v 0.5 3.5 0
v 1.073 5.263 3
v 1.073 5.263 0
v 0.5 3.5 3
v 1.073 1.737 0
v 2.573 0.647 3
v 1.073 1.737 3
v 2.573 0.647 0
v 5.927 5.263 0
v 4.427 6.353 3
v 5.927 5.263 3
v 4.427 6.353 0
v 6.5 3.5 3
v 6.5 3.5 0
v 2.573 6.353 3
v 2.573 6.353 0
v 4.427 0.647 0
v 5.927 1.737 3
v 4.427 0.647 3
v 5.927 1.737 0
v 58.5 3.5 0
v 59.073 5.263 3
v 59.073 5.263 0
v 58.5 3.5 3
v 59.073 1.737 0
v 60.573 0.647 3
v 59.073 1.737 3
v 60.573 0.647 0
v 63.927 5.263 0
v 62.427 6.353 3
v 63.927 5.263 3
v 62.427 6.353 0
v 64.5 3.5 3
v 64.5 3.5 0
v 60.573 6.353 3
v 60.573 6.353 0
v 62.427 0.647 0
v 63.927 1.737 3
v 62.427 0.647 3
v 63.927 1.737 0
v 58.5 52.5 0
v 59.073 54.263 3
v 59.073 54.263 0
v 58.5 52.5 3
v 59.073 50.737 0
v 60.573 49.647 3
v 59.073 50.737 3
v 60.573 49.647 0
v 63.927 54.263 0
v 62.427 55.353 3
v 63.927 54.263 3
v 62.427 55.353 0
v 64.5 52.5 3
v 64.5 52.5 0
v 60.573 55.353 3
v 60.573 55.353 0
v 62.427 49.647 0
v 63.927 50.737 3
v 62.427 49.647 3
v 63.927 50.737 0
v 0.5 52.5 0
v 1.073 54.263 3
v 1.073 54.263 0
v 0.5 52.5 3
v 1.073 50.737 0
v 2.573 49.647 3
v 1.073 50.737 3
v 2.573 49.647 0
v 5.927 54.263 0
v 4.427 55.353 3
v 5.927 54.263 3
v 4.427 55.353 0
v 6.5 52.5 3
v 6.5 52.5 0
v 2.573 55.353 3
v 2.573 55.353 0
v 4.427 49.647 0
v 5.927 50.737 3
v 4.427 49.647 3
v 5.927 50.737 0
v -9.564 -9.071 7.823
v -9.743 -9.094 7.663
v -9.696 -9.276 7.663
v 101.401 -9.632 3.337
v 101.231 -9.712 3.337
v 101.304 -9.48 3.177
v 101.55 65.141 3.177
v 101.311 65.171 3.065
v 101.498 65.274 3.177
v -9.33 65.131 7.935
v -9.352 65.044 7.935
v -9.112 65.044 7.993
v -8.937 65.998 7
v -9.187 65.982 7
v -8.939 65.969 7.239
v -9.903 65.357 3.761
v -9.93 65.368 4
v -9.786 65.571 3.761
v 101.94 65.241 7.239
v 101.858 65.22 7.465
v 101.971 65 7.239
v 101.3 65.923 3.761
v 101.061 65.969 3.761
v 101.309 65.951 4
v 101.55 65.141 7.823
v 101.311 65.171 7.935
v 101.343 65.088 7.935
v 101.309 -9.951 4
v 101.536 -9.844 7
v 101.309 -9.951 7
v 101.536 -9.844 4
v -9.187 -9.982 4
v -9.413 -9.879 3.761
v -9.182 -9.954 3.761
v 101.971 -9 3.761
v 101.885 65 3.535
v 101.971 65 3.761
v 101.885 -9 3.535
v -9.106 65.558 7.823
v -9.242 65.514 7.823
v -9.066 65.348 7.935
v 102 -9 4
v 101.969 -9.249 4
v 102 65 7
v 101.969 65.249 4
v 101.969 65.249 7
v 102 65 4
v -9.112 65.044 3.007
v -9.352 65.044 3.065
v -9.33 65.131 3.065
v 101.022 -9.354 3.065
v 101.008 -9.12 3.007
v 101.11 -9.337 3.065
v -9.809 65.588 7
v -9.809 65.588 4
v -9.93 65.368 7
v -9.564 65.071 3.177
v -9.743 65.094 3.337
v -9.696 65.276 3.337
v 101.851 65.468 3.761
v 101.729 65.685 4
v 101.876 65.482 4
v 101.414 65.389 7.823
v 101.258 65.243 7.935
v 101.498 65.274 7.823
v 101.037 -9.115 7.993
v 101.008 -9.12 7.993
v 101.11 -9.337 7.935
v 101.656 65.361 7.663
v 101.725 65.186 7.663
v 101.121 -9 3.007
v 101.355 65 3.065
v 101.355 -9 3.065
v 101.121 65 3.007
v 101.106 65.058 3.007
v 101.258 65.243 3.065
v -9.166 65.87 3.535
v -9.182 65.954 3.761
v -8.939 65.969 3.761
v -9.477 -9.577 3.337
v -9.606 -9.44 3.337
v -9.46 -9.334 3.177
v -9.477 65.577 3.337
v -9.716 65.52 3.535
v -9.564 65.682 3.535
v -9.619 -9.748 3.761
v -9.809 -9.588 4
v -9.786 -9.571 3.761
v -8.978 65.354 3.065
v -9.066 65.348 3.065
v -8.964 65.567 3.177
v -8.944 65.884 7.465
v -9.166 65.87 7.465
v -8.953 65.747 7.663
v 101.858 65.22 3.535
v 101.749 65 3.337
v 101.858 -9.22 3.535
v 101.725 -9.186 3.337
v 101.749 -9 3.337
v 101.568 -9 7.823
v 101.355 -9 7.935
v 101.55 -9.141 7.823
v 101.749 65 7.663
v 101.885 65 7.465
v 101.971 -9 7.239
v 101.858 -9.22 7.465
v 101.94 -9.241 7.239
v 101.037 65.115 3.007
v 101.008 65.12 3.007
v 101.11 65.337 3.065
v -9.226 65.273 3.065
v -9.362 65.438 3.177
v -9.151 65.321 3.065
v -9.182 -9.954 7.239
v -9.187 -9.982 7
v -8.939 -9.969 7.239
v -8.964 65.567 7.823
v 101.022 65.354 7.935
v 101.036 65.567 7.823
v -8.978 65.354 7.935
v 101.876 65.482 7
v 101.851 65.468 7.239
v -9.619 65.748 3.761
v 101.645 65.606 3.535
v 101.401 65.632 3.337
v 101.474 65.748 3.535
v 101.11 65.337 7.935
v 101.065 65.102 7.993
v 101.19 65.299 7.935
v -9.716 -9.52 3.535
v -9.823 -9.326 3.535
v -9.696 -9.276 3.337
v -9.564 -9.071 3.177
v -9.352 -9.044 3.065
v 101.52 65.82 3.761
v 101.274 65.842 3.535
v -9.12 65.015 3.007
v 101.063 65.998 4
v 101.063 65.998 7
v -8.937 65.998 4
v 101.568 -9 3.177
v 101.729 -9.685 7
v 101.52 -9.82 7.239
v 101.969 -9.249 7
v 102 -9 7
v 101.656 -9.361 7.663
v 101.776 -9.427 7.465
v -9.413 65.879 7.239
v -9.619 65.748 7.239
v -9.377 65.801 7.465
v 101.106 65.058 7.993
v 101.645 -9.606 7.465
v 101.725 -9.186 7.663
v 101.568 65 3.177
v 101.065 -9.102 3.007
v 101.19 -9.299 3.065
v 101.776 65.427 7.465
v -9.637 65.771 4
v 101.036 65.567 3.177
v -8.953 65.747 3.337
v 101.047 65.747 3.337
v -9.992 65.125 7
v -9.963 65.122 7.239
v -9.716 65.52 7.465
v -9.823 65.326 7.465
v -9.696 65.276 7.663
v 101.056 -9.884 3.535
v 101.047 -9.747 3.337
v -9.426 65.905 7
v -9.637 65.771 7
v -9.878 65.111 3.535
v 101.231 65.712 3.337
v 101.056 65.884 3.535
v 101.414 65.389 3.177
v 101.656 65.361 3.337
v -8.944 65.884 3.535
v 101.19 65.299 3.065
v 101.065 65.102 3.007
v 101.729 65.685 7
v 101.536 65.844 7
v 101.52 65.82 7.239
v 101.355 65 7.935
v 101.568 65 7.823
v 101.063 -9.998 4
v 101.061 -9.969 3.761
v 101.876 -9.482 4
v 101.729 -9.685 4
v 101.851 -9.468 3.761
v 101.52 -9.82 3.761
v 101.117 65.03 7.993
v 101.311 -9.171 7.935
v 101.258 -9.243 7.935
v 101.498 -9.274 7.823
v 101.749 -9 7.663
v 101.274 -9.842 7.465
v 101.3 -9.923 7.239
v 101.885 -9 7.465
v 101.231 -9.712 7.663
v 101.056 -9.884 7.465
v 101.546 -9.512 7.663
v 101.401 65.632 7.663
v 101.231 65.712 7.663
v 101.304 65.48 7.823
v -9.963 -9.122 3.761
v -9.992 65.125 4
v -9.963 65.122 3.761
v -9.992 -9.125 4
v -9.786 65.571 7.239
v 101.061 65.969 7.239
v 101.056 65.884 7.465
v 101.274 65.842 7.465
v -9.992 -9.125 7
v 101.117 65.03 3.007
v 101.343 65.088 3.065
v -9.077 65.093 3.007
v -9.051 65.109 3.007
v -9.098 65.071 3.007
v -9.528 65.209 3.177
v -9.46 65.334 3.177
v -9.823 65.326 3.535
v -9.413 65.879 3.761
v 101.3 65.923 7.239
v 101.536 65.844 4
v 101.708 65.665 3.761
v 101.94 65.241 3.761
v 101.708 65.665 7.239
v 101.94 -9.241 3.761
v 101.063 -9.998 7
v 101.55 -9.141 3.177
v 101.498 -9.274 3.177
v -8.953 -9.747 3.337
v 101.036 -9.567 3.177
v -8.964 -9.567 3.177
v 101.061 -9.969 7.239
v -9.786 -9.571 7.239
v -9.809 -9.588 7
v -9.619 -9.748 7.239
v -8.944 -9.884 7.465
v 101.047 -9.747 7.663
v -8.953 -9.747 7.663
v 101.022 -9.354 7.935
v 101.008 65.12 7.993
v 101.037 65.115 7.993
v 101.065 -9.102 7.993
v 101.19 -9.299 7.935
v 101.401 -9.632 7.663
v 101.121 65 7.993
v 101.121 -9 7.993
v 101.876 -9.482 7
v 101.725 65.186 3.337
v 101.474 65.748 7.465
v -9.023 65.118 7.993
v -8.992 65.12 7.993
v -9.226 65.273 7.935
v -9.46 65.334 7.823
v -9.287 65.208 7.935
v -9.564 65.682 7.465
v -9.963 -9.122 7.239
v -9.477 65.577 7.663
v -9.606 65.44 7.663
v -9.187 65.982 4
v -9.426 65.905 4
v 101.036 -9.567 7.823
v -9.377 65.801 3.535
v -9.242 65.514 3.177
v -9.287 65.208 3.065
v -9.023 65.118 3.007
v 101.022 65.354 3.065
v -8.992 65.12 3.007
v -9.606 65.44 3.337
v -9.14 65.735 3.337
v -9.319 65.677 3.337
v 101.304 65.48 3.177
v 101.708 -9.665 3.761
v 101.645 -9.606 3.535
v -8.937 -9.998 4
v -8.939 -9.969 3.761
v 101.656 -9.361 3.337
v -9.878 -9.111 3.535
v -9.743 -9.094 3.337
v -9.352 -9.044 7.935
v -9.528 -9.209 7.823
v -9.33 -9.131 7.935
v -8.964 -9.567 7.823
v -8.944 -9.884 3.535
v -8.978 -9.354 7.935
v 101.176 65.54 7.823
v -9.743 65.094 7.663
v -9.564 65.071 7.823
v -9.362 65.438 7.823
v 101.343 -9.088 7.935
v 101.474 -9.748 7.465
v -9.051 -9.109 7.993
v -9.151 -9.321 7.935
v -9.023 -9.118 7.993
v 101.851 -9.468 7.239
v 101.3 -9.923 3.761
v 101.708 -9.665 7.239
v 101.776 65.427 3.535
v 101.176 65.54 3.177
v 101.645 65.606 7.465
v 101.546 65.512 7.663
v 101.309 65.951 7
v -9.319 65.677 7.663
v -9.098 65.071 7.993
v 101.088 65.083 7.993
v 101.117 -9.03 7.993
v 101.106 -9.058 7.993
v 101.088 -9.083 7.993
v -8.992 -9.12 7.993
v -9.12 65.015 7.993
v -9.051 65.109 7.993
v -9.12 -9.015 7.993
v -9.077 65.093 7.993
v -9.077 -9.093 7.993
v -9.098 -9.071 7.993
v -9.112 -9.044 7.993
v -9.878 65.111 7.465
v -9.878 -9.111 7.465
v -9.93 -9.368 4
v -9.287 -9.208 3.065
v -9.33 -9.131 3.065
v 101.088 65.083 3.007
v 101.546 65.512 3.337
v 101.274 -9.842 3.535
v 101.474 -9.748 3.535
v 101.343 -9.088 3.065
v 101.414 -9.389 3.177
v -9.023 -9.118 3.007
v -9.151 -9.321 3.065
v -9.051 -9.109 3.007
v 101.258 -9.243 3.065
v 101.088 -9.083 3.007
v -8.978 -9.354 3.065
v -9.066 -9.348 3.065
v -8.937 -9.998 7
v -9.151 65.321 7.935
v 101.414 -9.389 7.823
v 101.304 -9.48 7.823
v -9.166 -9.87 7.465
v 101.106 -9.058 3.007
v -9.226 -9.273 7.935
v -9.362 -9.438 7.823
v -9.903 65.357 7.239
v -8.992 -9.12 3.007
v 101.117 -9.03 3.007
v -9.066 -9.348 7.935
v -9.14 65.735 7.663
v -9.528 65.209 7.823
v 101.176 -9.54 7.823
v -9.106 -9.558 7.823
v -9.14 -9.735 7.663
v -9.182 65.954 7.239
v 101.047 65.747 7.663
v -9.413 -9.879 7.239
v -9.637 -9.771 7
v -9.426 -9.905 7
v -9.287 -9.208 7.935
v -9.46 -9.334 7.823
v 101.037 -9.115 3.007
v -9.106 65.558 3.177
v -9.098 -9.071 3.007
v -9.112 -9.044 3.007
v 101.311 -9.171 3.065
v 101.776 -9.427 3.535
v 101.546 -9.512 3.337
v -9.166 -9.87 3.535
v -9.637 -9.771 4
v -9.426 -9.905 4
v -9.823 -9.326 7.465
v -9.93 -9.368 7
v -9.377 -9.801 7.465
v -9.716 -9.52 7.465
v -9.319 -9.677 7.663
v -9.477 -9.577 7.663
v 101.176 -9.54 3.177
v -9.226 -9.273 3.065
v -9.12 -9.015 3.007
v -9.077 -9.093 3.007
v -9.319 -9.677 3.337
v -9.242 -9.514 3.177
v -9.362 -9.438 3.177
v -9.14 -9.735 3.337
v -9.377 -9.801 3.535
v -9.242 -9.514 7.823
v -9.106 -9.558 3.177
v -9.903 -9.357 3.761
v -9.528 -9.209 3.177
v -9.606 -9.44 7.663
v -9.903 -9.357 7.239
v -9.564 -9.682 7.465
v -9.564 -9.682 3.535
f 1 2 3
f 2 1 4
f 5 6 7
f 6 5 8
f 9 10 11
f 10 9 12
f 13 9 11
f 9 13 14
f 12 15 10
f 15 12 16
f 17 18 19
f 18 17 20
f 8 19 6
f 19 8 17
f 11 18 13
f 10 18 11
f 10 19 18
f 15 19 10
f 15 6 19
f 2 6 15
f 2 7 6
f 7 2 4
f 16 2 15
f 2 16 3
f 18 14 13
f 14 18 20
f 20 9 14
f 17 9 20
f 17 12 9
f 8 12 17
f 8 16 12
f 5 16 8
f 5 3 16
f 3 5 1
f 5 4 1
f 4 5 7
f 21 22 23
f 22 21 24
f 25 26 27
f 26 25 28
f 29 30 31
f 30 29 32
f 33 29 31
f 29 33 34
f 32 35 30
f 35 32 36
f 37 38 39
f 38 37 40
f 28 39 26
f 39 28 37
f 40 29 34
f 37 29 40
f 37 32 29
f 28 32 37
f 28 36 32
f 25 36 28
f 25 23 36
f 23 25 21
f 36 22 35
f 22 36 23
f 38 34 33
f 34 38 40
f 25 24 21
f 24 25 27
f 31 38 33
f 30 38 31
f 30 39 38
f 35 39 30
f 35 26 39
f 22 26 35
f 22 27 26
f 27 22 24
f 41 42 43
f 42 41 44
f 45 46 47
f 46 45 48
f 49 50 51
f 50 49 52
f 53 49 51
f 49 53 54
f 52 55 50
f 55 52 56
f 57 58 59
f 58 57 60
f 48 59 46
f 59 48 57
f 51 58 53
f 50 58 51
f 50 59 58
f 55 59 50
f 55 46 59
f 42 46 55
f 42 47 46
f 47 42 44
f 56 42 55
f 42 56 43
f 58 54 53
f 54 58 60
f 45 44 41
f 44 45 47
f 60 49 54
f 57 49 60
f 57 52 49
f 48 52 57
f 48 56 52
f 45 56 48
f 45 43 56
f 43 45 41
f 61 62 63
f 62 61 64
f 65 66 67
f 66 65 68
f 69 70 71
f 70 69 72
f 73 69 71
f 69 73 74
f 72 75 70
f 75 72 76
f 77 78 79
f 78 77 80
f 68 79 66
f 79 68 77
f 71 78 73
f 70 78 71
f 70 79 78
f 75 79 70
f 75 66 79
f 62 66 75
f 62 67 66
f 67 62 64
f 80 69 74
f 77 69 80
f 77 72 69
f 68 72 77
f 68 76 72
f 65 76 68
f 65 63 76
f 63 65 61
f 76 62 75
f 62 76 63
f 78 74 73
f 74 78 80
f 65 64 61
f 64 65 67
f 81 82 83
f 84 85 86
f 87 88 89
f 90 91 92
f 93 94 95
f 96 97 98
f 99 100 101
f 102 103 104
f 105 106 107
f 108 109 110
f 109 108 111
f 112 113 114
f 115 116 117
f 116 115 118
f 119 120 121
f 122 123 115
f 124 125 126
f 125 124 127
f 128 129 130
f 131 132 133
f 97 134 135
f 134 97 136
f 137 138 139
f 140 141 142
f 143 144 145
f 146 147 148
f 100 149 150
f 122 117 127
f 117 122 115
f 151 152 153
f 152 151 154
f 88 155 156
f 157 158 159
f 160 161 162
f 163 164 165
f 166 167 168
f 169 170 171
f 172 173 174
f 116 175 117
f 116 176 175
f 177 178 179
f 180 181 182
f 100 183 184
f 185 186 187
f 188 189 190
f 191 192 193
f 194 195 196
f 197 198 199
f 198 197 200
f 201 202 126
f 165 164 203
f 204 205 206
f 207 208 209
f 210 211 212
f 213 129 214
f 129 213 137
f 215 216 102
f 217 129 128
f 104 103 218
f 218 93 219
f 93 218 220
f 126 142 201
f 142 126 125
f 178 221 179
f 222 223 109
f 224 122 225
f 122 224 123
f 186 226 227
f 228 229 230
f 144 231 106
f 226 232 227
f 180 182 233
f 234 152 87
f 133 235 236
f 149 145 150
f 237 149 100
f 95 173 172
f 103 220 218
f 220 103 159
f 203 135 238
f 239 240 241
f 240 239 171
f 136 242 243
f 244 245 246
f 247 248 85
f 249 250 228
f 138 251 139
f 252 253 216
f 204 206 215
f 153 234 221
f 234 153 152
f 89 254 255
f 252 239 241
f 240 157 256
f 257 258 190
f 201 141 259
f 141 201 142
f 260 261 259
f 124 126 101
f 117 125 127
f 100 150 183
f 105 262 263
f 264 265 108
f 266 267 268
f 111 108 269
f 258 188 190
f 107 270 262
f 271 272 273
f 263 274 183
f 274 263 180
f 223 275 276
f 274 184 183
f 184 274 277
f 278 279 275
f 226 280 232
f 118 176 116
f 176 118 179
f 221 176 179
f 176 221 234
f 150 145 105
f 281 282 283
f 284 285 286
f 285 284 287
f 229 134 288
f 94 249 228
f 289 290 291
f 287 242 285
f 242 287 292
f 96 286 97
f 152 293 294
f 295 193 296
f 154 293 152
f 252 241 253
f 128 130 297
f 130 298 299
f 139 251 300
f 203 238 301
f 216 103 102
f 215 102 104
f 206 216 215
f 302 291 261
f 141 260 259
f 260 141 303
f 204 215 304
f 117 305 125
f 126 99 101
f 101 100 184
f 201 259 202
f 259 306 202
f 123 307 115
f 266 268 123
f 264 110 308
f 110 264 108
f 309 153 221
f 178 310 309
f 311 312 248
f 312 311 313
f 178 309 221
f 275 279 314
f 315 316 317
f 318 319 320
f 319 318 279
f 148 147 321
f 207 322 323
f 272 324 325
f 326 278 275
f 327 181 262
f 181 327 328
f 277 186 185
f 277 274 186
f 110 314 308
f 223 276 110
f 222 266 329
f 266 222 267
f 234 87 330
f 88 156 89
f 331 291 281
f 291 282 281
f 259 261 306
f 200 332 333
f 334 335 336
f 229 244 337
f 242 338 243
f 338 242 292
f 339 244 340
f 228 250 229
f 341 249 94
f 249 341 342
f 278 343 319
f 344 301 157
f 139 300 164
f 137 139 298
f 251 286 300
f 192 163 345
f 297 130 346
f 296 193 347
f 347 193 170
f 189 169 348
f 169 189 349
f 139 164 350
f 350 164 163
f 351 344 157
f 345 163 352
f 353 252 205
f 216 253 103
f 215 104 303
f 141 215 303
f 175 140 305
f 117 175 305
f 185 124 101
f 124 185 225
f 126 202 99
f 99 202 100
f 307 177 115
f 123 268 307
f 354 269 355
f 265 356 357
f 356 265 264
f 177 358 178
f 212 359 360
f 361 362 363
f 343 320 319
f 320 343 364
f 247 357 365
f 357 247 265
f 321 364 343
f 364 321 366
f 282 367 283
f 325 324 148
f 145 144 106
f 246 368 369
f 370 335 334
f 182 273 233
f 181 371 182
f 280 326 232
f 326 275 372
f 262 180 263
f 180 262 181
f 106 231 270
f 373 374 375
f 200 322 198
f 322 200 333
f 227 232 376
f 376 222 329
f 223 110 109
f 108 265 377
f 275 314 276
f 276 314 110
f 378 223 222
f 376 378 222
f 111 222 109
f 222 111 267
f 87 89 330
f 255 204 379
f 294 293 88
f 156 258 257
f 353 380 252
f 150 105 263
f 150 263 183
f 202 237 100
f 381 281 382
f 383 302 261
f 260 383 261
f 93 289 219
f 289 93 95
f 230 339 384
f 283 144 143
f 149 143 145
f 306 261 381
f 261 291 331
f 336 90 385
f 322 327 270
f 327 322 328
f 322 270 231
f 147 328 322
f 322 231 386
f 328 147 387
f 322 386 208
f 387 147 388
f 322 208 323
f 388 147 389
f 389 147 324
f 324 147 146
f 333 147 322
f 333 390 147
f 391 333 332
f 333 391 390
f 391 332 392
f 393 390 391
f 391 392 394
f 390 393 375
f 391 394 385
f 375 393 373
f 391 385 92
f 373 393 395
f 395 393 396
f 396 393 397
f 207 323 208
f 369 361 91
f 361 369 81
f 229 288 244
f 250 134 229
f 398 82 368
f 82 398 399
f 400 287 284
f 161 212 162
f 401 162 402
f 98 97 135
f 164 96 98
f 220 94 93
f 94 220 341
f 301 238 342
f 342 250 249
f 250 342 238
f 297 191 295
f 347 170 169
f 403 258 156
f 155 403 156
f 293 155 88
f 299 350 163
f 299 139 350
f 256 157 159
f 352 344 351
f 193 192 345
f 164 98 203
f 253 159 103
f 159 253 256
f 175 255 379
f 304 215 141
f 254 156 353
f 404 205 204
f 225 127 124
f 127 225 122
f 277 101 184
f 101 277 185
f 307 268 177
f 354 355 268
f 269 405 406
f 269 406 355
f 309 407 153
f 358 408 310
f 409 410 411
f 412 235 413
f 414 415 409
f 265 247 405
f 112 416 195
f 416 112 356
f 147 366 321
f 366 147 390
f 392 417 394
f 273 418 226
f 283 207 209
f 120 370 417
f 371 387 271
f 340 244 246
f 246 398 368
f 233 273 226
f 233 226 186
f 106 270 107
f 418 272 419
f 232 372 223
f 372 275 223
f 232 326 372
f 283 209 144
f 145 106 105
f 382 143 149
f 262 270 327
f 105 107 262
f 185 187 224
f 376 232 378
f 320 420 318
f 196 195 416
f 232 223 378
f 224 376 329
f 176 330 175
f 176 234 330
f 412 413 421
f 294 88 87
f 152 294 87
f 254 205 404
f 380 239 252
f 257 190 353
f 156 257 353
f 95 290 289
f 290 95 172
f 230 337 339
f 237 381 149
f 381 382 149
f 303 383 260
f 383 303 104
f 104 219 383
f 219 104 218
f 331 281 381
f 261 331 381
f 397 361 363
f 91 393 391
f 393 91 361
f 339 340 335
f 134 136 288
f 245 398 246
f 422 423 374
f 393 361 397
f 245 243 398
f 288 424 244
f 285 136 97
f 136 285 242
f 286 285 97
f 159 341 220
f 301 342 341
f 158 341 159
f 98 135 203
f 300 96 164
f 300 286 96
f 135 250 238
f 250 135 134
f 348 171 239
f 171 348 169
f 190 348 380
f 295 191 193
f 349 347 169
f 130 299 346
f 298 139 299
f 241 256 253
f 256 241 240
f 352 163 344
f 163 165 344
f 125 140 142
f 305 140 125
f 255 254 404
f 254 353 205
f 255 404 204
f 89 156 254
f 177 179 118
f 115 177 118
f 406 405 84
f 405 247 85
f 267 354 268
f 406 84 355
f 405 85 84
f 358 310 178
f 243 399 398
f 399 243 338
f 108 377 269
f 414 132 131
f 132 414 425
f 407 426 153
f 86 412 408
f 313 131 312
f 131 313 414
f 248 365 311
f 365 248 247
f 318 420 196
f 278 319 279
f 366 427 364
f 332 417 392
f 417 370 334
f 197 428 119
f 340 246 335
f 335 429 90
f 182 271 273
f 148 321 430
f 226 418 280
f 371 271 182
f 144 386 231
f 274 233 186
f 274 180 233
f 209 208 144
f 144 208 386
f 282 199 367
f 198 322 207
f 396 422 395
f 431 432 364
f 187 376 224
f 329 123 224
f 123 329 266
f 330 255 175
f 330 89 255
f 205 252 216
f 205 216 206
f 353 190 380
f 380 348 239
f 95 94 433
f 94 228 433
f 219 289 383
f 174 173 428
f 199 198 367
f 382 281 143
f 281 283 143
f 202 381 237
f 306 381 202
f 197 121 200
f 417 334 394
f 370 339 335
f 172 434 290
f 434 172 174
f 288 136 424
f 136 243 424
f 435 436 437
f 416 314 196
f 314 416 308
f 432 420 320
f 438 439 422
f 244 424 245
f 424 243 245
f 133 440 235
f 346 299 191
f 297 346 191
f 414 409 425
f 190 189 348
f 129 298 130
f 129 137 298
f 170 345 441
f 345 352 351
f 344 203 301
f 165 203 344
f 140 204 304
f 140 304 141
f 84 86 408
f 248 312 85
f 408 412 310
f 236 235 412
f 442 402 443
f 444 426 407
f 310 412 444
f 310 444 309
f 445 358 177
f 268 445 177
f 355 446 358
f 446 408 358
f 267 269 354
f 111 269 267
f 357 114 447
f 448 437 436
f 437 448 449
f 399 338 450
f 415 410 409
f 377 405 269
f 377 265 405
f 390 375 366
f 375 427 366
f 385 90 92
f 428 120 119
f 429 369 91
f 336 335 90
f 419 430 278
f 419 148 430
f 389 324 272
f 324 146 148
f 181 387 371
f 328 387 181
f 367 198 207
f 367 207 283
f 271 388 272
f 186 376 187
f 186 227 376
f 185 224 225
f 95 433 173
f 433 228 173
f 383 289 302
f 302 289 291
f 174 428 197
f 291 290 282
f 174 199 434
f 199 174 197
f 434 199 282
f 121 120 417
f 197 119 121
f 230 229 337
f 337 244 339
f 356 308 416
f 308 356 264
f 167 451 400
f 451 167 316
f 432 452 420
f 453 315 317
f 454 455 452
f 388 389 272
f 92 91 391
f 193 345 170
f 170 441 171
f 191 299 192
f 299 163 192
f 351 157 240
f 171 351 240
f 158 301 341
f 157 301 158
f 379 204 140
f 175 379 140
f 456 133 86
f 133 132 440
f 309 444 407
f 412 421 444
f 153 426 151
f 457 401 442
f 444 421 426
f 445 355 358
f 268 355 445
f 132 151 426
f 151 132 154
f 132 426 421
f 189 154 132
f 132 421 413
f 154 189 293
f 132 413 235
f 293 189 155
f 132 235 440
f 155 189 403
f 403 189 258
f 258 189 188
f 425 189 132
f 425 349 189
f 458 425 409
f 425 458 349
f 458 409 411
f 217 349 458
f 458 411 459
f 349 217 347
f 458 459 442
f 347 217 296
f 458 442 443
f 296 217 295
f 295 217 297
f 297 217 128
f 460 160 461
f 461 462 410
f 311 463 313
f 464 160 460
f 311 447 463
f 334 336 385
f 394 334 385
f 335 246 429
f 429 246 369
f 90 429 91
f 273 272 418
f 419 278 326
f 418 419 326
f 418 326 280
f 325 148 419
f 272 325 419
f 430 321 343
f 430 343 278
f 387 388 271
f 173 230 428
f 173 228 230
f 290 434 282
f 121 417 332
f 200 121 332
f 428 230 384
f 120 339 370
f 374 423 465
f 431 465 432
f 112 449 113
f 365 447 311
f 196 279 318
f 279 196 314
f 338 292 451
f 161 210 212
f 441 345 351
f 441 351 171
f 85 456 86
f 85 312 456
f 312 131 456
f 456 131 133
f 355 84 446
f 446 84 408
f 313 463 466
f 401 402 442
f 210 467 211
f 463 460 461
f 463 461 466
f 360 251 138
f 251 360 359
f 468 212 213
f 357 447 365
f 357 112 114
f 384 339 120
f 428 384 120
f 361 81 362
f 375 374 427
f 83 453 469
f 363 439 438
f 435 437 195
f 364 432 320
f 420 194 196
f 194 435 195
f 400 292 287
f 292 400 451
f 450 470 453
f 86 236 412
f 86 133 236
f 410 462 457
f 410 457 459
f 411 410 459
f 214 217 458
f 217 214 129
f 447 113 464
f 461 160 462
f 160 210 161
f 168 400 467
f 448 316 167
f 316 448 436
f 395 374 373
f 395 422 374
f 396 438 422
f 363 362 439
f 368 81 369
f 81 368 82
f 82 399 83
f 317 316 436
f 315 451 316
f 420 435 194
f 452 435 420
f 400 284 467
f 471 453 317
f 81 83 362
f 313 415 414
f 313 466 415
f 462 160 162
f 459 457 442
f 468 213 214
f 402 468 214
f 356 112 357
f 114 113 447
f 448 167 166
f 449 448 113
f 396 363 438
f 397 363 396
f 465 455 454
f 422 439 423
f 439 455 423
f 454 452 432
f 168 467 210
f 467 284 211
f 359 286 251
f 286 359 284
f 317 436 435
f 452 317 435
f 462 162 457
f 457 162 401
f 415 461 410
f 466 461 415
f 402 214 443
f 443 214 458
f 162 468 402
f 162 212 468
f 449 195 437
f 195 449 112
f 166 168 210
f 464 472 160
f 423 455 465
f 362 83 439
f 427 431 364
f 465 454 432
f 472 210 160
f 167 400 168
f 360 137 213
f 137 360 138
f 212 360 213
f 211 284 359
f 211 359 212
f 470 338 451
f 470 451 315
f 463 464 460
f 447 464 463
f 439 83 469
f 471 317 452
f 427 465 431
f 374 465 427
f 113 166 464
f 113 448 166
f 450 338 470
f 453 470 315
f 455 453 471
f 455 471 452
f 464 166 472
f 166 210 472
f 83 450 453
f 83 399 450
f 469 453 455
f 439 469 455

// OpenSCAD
// file: lib/cover.scad
//fine = true; 
fine = false; 

$fn = fine ? 100 : 25;

roundcorner = 2; 

horn_arc = 45;

horn_diameter = 5;

base_size = 25.5;
plate_thickness = base_size / 8;




module bar(roundcorner = 1, x = base_size, y = base_size, z = plate_thickness, color = "purple") {
    translate([roundcorner, roundcorner, roundcorner]) {
        color(color) {
            minkowski() {
                cube([x - (roundcorner * 2), y - (roundcorner * 2), z - (roundcorner * 2)]);
                sphere(d = roundcorner * 2);
            }
        }
    }
}



    
module cover(x_ness = 1, y_ness = 1, base_shim = 0) {

    // base plate
    bar(x = base_size * x_ness, y = base_size * y_ness, z = plate_thickness - base_shim);

    // sides
    bar(color = "green", x = plate_thickness, y = base_size * y_ness, z = (plate_thickness * 3) - base_shim);
        translate([(base_size * x_ness) - plate_thickness, 0, 0]) 
    bar(color = "red", x = plate_thickness, y = base_size * y_ness, z = (plate_thickness * 3) - base_shim);
    bar(color = "blue", x = base_size * x_ness, y = plate_thickness, z = (plate_thickness * 3) - base_shim);
    
    // cover
    translate([0, 0, plate_thickness * 2]) {
        bar(color = "grey", x = plate_thickness * 2, y = base_size * y_ness);
        translate([(base_size * x_ness) - (plate_thickness * 2), 0, 0]) 
            bar(color = "black", x = plate_thickness * 2, y = base_size * y_ness);
        bar(color = "white", x = base_size * x_ness, y = plate_thickness * 2);
    }
}



cover(1,4, 0.1);

//translate([10, 0, 0]) cover(1,2);
// main file
pcb_thickness = 1.25;

standoff_outer_diameter = 6;
standoff_height = 3;  // TODO: ensure enough height to receive m2.5 screw


module standoff() {
    cylinder(d = standoff_outer_diameter, h = standoff_height);
}


translate([3.5, 3.5, 0]) standoff();
translate([58 + 3.5, 3.5, 0]) standoff();
translate([58 + 3.5, 49 + 3.5, 0]) standoff();
translate([3.5, 49 + 3.5, 0]) standoff();



use <lib/cover.scad>;

//translate([0, 0, standoff_height]) cube([58 + 3.5 + 3.5, 49 + 3.5 + 3.5, 5]);

translate([-10, -10, standoff_height]) bar(x = 85 + 3.5 + 3.5 + 20, y = 49 + 3.5 + 3.5 + 20, z = 5);
